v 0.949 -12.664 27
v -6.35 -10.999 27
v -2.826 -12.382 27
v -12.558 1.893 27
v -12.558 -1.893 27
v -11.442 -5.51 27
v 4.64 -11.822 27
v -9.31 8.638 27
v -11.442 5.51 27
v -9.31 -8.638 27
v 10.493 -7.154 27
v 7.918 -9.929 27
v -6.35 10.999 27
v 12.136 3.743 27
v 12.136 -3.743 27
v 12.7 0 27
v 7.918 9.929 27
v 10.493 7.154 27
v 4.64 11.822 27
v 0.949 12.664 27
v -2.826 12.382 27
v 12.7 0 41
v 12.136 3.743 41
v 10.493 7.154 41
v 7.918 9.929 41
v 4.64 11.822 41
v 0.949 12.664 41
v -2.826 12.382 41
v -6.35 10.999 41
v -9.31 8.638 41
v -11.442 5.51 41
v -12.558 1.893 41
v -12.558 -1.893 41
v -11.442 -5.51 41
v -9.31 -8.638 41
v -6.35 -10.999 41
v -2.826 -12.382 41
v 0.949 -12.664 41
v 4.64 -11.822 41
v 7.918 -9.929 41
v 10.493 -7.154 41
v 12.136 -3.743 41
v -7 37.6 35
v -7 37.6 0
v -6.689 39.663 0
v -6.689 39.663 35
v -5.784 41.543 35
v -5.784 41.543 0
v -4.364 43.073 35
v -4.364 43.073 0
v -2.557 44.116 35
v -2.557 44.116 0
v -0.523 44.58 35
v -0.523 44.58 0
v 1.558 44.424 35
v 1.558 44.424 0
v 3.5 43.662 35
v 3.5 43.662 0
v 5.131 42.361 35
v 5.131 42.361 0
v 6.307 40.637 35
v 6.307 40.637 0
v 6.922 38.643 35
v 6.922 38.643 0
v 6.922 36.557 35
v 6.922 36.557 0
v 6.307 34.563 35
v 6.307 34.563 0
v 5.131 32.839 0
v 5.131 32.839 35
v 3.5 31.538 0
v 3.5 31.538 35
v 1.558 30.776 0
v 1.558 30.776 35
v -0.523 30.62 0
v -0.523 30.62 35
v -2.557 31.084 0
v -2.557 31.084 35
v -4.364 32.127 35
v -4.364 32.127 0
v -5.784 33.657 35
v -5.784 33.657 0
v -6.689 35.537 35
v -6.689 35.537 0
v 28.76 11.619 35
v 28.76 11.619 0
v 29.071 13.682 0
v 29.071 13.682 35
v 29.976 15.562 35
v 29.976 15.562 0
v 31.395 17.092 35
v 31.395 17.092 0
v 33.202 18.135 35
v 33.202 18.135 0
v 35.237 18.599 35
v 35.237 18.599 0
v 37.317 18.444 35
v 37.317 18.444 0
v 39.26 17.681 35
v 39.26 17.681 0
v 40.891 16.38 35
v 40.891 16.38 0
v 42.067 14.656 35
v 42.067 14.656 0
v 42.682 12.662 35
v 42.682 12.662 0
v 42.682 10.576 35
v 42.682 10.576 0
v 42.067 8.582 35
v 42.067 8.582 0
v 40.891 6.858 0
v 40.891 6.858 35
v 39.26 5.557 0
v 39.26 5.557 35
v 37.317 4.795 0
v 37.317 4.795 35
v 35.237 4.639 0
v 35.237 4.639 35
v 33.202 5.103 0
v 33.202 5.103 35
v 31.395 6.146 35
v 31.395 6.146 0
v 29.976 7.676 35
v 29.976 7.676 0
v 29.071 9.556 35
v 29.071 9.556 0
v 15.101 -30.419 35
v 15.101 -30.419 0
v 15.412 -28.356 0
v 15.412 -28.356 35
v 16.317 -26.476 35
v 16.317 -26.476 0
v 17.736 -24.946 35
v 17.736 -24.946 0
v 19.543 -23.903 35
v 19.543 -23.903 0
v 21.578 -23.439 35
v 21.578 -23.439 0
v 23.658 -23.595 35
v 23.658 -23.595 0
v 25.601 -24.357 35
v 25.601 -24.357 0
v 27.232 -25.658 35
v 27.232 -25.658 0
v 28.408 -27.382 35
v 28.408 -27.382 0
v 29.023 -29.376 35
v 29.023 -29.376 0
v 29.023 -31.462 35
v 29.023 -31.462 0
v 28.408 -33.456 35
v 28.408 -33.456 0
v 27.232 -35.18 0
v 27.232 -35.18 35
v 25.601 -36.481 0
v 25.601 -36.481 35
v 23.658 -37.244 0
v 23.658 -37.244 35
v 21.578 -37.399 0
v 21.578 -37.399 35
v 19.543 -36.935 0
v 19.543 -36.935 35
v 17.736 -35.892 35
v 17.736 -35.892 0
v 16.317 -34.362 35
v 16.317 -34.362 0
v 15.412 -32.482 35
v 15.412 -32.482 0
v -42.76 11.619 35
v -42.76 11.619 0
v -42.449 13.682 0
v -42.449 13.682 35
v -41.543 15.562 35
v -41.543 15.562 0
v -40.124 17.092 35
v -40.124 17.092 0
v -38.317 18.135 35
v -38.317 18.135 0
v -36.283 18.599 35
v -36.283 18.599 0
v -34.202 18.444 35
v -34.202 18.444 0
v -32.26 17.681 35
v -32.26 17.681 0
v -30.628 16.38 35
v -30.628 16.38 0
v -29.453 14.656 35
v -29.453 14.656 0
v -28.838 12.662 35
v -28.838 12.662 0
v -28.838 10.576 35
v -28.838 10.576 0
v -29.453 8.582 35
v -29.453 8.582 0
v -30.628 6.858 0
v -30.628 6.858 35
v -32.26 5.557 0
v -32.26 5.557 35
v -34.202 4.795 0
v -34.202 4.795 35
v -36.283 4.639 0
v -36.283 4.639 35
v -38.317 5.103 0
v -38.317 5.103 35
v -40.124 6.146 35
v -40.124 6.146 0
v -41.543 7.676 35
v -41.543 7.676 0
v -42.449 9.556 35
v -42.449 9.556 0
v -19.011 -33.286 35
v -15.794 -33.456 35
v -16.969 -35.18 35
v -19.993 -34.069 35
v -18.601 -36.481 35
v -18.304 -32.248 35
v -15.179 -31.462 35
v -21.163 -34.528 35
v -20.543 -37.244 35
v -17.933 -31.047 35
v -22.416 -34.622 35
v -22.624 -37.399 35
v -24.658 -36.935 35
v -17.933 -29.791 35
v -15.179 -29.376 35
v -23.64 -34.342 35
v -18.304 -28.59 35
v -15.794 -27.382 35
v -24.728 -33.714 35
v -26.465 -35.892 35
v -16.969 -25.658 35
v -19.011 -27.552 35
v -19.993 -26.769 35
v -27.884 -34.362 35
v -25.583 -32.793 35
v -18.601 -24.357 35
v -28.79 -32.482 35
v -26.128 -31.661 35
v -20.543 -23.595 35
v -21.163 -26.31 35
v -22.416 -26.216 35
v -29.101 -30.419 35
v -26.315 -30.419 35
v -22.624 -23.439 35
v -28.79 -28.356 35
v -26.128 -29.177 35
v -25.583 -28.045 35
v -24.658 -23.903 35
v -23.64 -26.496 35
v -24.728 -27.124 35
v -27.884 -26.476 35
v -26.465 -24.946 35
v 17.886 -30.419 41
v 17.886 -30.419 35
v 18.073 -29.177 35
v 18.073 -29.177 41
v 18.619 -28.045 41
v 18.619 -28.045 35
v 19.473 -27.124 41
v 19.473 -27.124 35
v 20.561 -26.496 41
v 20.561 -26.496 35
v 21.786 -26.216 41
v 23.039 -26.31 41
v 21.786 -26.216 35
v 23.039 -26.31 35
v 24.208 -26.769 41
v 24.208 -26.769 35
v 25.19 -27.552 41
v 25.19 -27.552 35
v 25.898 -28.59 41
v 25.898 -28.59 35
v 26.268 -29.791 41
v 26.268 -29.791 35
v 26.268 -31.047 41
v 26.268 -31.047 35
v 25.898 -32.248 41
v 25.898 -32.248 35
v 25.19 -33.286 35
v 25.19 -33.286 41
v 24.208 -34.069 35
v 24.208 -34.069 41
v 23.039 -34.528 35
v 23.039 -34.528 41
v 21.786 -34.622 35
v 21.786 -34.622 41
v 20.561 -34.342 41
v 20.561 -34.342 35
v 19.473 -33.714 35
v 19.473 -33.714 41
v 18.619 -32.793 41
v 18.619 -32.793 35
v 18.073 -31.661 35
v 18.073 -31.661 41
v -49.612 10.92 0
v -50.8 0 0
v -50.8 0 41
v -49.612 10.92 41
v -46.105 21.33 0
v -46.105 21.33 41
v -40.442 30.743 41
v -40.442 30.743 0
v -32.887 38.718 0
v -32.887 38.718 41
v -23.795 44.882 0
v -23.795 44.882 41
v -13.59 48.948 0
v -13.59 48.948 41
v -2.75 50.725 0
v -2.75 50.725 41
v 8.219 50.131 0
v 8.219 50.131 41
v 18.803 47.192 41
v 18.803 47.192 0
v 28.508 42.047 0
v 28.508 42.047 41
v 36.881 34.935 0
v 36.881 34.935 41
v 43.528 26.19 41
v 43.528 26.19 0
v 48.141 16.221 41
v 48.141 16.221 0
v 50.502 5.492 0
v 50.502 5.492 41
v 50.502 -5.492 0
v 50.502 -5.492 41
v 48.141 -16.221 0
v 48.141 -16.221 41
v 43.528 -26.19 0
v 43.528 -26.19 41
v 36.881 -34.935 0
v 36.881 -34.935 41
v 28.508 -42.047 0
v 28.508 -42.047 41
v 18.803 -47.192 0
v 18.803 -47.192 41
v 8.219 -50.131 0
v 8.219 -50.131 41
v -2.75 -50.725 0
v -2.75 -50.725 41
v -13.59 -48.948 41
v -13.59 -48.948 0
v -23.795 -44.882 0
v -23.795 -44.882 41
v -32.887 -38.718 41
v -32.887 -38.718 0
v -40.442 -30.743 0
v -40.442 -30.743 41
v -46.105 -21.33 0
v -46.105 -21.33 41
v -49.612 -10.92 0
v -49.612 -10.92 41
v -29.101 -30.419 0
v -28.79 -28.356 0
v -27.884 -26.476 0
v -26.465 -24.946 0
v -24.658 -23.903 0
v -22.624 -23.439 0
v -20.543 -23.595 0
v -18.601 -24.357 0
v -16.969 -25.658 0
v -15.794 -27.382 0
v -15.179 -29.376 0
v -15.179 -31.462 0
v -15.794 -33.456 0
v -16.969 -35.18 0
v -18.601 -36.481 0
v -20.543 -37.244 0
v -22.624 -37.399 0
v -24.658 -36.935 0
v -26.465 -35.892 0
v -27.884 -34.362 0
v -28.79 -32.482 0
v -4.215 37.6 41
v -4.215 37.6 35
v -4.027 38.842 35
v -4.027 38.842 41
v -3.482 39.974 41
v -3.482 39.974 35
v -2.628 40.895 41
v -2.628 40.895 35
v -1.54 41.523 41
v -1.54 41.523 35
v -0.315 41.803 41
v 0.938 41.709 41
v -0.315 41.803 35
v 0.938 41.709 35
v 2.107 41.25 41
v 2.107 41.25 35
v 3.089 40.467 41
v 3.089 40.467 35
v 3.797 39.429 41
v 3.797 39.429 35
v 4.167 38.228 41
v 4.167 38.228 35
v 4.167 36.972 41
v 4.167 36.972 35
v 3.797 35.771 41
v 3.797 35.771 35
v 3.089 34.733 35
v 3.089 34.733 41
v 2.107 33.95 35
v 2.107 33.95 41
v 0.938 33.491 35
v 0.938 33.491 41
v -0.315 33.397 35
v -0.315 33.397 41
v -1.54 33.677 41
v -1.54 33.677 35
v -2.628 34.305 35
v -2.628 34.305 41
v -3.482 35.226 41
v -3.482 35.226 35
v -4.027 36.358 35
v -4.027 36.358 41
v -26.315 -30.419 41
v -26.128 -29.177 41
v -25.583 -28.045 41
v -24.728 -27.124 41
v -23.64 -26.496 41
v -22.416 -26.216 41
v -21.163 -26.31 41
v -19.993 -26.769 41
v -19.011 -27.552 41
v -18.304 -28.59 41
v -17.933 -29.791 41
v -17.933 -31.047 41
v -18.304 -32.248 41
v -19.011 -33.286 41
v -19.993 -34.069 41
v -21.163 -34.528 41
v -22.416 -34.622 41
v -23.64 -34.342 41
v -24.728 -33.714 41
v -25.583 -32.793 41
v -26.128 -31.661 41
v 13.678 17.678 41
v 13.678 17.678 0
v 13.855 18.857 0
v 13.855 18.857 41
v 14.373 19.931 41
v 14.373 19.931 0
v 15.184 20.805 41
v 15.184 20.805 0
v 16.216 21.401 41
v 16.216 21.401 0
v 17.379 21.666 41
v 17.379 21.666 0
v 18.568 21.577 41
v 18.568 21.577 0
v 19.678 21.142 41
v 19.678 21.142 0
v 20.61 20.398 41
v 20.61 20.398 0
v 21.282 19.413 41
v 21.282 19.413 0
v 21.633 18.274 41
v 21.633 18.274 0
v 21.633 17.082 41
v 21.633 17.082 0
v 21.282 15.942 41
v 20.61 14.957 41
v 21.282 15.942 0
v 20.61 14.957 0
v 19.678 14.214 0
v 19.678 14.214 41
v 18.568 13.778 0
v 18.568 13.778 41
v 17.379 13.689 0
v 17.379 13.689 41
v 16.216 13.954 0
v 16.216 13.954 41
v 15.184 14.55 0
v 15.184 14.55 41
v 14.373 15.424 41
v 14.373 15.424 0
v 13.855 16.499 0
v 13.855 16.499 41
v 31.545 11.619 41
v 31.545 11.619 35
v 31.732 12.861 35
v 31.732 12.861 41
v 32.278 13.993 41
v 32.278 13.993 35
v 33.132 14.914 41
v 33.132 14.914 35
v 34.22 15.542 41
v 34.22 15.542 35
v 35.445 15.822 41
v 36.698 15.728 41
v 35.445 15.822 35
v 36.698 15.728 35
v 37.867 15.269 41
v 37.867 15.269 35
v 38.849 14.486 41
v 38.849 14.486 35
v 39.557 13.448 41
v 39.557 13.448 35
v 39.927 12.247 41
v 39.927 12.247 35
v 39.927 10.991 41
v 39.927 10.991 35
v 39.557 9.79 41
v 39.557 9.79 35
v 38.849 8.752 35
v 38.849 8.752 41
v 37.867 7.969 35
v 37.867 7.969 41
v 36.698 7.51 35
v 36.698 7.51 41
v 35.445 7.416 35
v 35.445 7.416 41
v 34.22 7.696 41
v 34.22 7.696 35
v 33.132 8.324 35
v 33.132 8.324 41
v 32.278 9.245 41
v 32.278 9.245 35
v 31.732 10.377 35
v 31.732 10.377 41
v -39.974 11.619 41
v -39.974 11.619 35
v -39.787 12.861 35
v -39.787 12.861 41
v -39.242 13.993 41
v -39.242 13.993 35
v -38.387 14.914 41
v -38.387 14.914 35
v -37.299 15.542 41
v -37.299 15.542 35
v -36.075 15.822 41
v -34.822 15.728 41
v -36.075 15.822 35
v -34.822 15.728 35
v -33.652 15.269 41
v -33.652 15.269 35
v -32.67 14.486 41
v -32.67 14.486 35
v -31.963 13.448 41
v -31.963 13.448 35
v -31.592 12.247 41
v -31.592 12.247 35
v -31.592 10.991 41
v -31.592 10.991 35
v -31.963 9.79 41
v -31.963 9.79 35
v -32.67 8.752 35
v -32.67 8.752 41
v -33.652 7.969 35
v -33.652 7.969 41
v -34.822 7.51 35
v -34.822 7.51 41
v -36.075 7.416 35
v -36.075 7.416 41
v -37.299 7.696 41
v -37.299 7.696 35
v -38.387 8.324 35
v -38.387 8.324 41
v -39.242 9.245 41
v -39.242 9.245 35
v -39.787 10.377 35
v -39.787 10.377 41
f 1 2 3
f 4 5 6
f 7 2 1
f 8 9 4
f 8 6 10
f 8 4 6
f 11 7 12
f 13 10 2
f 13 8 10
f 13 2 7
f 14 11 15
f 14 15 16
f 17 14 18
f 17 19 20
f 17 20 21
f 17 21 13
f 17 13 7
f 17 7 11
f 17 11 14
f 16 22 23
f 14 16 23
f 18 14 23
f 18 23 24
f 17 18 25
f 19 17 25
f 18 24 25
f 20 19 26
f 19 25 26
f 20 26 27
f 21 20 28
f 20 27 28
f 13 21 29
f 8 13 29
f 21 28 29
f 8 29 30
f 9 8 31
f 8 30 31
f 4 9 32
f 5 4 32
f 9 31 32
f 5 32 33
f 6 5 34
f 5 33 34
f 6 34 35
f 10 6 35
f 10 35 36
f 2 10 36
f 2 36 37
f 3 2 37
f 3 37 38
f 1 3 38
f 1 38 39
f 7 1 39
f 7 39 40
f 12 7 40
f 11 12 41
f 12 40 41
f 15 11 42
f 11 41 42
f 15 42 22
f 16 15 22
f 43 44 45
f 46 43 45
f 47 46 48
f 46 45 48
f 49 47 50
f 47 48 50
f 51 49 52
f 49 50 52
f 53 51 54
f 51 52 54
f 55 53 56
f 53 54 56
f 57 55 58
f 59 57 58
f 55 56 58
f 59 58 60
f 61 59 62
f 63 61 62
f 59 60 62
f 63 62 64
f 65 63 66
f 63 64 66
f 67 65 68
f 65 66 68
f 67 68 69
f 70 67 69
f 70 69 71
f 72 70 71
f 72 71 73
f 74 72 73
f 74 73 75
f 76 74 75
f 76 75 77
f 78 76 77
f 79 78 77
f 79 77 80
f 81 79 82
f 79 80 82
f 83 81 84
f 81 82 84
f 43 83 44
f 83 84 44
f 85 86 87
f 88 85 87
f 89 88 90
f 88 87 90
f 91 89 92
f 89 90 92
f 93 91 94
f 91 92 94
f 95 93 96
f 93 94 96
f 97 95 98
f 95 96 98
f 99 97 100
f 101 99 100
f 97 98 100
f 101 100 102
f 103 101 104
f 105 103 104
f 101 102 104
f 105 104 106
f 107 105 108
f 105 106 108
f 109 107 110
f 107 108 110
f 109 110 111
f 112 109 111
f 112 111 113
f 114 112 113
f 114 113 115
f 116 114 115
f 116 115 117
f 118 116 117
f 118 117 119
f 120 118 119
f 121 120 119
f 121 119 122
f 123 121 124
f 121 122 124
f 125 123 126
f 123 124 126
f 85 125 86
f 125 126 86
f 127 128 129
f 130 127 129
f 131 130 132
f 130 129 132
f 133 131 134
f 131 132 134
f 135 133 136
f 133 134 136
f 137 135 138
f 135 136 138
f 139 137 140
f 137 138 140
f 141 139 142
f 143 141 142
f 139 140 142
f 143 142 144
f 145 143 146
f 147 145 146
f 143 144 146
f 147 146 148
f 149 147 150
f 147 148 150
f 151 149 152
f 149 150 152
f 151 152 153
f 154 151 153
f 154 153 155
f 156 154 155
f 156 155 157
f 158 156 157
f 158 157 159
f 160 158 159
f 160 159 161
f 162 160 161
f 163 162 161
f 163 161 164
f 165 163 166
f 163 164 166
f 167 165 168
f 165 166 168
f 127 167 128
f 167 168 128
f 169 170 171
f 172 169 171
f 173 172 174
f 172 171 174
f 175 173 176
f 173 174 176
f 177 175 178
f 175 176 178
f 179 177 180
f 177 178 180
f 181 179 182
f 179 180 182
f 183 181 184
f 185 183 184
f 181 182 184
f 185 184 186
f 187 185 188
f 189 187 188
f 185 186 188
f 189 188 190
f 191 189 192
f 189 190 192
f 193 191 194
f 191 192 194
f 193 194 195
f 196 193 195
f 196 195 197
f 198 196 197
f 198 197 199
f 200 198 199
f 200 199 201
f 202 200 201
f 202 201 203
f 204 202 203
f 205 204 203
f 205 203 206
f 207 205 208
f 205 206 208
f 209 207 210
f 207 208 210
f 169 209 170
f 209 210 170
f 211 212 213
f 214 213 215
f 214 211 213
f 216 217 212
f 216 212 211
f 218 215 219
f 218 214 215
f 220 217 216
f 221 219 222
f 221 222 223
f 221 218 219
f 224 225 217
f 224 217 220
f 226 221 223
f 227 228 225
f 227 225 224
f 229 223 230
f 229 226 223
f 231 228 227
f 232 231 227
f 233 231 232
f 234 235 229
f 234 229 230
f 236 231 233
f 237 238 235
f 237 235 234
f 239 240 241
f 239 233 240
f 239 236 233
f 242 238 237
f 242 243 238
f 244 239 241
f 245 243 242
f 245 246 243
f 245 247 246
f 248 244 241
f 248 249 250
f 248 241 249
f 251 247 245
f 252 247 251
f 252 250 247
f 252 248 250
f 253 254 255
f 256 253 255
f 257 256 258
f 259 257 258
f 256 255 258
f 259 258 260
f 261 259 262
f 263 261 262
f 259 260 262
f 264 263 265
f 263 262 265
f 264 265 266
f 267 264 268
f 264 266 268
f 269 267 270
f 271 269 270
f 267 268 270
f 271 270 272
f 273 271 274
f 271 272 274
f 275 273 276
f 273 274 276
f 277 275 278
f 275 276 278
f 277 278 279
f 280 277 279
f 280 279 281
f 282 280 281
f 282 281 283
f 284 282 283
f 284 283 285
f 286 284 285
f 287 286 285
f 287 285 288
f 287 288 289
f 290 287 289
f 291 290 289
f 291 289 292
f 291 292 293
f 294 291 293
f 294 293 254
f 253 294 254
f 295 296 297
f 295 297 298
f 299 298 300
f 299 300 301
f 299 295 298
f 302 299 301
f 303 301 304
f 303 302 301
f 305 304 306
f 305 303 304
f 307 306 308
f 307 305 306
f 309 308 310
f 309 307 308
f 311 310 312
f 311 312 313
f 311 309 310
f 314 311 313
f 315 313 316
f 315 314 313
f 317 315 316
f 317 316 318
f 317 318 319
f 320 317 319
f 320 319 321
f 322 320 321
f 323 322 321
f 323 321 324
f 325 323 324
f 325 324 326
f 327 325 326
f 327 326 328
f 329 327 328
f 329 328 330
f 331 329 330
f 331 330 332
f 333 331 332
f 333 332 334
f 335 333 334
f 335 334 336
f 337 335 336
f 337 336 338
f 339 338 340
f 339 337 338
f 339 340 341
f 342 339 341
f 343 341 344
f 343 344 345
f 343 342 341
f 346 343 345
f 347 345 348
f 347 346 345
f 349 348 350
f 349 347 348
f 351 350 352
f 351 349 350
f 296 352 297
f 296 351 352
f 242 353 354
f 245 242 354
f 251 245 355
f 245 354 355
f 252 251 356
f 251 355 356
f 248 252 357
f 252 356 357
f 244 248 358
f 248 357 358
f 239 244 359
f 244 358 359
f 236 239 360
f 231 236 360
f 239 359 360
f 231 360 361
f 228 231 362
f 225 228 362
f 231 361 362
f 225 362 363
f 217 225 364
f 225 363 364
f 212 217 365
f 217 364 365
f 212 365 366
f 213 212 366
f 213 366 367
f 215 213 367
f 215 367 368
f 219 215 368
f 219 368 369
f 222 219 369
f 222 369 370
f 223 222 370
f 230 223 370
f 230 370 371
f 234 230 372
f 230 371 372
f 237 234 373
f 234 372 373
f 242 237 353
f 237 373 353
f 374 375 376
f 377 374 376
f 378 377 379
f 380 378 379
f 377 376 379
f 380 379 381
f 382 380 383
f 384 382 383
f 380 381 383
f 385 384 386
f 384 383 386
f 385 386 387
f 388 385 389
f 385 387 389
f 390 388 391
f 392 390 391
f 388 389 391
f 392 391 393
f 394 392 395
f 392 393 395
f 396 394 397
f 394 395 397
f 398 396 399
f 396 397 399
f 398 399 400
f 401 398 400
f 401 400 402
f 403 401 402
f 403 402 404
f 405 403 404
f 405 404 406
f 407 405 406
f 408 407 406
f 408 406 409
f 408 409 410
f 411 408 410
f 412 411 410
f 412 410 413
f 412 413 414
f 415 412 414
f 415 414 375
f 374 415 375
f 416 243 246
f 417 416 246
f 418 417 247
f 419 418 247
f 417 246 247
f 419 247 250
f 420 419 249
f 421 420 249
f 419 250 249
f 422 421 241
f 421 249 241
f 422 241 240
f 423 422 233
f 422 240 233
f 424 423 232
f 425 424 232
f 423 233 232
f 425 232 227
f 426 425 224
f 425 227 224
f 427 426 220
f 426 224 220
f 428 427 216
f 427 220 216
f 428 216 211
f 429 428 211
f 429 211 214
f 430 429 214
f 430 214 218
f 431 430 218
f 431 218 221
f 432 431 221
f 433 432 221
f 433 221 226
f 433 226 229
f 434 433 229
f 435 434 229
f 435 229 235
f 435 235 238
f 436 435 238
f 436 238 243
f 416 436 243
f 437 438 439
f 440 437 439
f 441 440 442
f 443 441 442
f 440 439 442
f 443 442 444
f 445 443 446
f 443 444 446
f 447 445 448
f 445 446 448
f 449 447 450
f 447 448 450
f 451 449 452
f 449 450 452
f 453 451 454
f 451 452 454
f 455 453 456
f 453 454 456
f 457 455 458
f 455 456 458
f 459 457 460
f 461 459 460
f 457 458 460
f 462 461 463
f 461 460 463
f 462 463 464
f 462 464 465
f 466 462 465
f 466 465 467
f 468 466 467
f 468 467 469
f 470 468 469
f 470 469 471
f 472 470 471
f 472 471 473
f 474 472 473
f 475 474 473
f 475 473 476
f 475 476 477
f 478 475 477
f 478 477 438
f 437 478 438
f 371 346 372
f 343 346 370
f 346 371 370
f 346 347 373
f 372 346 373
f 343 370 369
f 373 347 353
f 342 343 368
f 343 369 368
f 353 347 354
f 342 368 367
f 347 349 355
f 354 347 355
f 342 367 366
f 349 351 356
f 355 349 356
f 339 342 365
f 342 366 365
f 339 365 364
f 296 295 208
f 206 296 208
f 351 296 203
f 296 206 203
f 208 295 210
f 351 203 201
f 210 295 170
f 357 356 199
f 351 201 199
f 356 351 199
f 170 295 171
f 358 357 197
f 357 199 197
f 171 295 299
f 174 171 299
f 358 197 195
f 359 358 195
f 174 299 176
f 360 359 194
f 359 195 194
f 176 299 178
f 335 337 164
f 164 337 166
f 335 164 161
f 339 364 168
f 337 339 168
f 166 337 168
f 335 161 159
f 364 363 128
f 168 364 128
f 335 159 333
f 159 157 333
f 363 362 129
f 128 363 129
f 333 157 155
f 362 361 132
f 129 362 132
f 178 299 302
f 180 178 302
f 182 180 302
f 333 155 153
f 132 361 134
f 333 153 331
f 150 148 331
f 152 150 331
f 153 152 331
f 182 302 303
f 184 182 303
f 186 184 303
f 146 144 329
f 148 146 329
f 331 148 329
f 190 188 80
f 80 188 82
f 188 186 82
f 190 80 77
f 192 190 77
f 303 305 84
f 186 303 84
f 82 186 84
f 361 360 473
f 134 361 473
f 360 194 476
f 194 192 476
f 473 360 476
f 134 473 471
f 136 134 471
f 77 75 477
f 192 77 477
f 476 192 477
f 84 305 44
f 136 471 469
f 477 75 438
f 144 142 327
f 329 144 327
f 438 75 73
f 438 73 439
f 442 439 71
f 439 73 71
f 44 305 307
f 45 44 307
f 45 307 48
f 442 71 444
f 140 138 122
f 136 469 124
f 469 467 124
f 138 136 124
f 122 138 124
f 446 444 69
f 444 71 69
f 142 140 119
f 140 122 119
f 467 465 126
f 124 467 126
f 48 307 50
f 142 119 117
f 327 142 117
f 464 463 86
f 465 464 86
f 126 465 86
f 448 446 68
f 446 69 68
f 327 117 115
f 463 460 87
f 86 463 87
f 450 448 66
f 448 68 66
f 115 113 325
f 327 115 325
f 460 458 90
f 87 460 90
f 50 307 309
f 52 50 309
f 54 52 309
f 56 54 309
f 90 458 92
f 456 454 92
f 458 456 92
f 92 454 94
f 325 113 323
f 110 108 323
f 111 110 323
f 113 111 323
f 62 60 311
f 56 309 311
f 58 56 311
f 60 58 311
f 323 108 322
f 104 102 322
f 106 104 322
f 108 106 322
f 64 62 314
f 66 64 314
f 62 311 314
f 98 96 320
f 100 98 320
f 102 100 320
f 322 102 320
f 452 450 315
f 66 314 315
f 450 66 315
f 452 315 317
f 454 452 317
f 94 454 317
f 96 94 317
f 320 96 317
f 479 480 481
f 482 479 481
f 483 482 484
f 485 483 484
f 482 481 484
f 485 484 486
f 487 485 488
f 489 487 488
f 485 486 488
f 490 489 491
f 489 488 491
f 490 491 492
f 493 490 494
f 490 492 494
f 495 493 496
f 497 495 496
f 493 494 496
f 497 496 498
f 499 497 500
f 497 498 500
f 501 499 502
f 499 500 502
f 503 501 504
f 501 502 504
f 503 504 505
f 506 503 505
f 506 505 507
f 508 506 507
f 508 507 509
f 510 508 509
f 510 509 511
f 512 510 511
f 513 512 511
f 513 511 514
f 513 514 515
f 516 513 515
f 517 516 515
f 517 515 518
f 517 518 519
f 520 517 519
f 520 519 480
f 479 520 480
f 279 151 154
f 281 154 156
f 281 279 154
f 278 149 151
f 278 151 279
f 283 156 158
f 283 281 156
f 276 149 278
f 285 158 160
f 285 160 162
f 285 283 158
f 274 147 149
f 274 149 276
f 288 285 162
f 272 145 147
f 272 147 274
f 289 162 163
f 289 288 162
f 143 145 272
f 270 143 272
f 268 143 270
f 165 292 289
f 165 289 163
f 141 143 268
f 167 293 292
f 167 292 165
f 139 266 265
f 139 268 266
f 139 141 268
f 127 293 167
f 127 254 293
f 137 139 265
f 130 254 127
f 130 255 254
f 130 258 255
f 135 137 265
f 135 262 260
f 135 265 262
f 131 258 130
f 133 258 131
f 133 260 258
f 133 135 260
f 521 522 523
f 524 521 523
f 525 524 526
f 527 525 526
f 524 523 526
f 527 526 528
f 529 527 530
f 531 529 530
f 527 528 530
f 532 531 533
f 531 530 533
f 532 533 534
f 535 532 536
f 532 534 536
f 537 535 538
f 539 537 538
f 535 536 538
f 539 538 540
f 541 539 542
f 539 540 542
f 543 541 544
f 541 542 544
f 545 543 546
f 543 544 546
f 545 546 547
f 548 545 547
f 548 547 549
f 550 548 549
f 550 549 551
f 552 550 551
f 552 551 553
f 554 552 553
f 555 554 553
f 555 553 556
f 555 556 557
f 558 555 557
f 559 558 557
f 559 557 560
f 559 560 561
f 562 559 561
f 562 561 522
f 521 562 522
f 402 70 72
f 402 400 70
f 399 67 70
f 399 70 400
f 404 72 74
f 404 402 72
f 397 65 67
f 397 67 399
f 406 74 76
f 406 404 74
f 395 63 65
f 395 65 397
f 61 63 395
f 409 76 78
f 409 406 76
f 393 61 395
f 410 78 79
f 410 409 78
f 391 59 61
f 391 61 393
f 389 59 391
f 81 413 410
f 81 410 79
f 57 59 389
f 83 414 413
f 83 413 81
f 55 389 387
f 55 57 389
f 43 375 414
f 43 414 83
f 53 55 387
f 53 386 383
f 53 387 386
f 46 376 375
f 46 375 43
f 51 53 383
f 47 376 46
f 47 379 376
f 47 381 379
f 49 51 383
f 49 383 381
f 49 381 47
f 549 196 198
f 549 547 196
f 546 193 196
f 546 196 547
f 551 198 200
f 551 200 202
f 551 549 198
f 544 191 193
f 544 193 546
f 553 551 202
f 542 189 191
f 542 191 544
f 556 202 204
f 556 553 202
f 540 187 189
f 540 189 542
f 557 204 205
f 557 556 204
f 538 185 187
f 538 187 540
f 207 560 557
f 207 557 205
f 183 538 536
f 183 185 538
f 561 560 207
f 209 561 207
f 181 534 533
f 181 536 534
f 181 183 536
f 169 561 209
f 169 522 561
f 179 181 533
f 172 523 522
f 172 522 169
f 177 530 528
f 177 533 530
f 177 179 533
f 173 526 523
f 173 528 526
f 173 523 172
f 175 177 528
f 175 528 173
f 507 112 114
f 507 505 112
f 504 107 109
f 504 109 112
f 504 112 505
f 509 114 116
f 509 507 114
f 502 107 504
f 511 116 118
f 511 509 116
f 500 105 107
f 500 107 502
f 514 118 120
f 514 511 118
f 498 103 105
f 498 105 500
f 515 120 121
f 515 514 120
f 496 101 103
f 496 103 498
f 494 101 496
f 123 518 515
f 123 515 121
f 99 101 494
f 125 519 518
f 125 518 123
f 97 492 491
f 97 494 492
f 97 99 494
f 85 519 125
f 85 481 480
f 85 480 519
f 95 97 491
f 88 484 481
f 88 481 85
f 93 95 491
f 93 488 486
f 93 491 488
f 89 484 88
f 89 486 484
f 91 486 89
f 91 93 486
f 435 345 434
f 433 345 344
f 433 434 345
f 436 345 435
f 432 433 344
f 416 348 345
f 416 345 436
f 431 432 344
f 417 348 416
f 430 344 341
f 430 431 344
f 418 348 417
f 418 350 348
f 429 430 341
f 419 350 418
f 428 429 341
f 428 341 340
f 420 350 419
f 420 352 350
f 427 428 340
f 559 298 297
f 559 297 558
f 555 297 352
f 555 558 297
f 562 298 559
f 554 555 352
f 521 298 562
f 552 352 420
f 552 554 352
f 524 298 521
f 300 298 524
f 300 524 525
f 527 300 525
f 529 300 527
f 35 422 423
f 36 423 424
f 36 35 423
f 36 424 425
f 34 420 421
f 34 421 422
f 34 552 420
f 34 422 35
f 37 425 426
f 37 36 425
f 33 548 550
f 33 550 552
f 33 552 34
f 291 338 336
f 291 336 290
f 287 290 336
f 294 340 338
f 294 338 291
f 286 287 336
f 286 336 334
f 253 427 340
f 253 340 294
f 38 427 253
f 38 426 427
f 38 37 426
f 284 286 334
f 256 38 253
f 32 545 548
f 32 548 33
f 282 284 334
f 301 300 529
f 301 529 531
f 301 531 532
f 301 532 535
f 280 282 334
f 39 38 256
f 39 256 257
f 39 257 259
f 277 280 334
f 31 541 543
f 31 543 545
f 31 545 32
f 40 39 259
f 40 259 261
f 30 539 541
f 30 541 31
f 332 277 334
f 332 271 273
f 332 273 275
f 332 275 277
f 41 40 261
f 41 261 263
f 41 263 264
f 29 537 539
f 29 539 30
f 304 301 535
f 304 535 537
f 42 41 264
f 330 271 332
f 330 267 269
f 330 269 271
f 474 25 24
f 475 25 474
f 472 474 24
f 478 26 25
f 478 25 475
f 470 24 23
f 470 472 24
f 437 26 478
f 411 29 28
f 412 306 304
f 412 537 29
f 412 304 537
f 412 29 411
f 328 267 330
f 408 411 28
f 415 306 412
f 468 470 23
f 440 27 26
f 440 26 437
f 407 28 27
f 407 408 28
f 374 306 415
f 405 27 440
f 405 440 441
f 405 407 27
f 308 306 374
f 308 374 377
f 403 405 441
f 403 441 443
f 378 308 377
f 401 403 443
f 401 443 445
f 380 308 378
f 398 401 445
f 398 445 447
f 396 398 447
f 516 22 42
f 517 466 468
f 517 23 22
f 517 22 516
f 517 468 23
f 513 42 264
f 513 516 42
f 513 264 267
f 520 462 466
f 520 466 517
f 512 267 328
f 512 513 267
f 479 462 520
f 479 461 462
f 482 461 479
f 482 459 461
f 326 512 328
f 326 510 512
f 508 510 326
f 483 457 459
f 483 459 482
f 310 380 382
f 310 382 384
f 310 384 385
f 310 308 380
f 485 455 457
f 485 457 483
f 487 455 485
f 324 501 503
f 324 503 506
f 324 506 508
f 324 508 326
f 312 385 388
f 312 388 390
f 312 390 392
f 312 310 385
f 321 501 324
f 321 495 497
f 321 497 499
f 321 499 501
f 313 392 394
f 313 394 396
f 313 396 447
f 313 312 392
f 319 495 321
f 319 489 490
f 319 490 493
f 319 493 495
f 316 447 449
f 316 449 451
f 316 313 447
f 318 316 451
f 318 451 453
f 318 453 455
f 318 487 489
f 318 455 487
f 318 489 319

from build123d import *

# Parameters (mm, degrees)
SKETCH1_W           = 119
SKETCH1_H           = 114
BOSS_EXTRUDE1_DEPTH = 41
SKETCH4_R           = 4.214519236
CUT_EXTRUDE1_DEPTH  = 41
SKETCH7_R           = 7
CUT_EXTRUDE2_DEPTH  = 35
SKETCH8_R           = 4
CUT_EXTRUDE3_DEPTH  = 55
SKETCH9_R           = 12.7
CUT_EXTRUDE4_DEPTH  = 14
SKETCH10_OUTSIDE_W  = 154.964
SKETCH10_OUTSIDE_H  = 149.964
SKETCH10_OUTSIDE_R  = 50.8
CUT_EXTRUDE5_DEPTH  = 55


with BuildPart() as part:
    # Sketch1 → Boss-Extrude1 (new body)
    with BuildSketch(Plane.XY):
        Rectangle(SKETCH1_W, SKETCH1_H)
    extrude(amount=BOSS_EXTRUDE1_DEPTH)

    # Sketch4 → Cut-Extrude1 (cut)
    with BuildSketch(Plane(origin=(0, 0, 0), x_dir=(-1, 0, 0), z_dir=(0, 0, -1))):
        with Locations((0, 37.6)):
            Circle(SKETCH4_R)
        with Locations((35.759725013, 11.619038988)):
            Circle(SKETCH4_R)
        with Locations((22.100725486, -30.419038988)):
            Circle(SKETCH4_R)
        with Locations((-22.100725486, -30.419038988)):
            Circle(SKETCH4_R)
        with Locations((-35.759725013, 11.619038988)):
            Circle(SKETCH4_R)
    extrude(amount=-CUT_EXTRUDE1_DEPTH, mode=Mode.SUBTRACT)

    # Sketch7 → Cut-Extrude2 (cut)
    with BuildSketch(Plane(origin=(0, 0, 0), x_dir=(-1, 0, 0), z_dir=(0, 0, -1))):
        with Locations((0, 37.6)):
            Circle(SKETCH7_R)
        with Locations((35.759725013, 11.619038988)):
            Circle(SKETCH7_R)
        with Locations((22.100725486, -30.419038988)):
            Circle(SKETCH7_R)
        with Locations((-22.100725486, -30.419038988)):
            Circle(SKETCH7_R)
        with Locations((-35.759725013, 11.619038988)):
            Circle(SKETCH7_R)
    extrude(amount=-CUT_EXTRUDE2_DEPTH, mode=Mode.SUBTRACT)

    # Sketch8 → Cut-Extrude3 (cut)
    with BuildSketch(Plane(origin=(0, 0, 0), x_dir=(-1, 0, 0), z_dir=(0, 0, -1))):
        with Locations((-17.67766953, 17.67766953)):
            Circle(SKETCH8_R)
    extrude(amount=-CUT_EXTRUDE3_DEPTH, mode=Mode.SUBTRACT)

    # Sketch9 → Cut-Extrude4 (cut)
    with BuildSketch(Plane.XY.offset(41)):
        Circle(SKETCH9_R)
    extrude(amount=-CUT_EXTRUDE4_DEPTH, mode=Mode.SUBTRACT)

    # Sketch10 outside → Cut-Extrude5 (cut)
    with BuildSketch(Plane(origin=(0, 0, 0), x_dir=(-1, 0, 0), z_dir=(0, 0, -1))):
        Rectangle(SKETCH10_OUTSIDE_W, SKETCH10_OUTSIDE_H)
        Circle(SKETCH10_OUTSIDE_R, mode=Mode.SUBTRACT)
    extrude(amount=-CUT_EXTRUDE5_DEPTH, mode=Mode.SUBTRACT)


solid = part.part
